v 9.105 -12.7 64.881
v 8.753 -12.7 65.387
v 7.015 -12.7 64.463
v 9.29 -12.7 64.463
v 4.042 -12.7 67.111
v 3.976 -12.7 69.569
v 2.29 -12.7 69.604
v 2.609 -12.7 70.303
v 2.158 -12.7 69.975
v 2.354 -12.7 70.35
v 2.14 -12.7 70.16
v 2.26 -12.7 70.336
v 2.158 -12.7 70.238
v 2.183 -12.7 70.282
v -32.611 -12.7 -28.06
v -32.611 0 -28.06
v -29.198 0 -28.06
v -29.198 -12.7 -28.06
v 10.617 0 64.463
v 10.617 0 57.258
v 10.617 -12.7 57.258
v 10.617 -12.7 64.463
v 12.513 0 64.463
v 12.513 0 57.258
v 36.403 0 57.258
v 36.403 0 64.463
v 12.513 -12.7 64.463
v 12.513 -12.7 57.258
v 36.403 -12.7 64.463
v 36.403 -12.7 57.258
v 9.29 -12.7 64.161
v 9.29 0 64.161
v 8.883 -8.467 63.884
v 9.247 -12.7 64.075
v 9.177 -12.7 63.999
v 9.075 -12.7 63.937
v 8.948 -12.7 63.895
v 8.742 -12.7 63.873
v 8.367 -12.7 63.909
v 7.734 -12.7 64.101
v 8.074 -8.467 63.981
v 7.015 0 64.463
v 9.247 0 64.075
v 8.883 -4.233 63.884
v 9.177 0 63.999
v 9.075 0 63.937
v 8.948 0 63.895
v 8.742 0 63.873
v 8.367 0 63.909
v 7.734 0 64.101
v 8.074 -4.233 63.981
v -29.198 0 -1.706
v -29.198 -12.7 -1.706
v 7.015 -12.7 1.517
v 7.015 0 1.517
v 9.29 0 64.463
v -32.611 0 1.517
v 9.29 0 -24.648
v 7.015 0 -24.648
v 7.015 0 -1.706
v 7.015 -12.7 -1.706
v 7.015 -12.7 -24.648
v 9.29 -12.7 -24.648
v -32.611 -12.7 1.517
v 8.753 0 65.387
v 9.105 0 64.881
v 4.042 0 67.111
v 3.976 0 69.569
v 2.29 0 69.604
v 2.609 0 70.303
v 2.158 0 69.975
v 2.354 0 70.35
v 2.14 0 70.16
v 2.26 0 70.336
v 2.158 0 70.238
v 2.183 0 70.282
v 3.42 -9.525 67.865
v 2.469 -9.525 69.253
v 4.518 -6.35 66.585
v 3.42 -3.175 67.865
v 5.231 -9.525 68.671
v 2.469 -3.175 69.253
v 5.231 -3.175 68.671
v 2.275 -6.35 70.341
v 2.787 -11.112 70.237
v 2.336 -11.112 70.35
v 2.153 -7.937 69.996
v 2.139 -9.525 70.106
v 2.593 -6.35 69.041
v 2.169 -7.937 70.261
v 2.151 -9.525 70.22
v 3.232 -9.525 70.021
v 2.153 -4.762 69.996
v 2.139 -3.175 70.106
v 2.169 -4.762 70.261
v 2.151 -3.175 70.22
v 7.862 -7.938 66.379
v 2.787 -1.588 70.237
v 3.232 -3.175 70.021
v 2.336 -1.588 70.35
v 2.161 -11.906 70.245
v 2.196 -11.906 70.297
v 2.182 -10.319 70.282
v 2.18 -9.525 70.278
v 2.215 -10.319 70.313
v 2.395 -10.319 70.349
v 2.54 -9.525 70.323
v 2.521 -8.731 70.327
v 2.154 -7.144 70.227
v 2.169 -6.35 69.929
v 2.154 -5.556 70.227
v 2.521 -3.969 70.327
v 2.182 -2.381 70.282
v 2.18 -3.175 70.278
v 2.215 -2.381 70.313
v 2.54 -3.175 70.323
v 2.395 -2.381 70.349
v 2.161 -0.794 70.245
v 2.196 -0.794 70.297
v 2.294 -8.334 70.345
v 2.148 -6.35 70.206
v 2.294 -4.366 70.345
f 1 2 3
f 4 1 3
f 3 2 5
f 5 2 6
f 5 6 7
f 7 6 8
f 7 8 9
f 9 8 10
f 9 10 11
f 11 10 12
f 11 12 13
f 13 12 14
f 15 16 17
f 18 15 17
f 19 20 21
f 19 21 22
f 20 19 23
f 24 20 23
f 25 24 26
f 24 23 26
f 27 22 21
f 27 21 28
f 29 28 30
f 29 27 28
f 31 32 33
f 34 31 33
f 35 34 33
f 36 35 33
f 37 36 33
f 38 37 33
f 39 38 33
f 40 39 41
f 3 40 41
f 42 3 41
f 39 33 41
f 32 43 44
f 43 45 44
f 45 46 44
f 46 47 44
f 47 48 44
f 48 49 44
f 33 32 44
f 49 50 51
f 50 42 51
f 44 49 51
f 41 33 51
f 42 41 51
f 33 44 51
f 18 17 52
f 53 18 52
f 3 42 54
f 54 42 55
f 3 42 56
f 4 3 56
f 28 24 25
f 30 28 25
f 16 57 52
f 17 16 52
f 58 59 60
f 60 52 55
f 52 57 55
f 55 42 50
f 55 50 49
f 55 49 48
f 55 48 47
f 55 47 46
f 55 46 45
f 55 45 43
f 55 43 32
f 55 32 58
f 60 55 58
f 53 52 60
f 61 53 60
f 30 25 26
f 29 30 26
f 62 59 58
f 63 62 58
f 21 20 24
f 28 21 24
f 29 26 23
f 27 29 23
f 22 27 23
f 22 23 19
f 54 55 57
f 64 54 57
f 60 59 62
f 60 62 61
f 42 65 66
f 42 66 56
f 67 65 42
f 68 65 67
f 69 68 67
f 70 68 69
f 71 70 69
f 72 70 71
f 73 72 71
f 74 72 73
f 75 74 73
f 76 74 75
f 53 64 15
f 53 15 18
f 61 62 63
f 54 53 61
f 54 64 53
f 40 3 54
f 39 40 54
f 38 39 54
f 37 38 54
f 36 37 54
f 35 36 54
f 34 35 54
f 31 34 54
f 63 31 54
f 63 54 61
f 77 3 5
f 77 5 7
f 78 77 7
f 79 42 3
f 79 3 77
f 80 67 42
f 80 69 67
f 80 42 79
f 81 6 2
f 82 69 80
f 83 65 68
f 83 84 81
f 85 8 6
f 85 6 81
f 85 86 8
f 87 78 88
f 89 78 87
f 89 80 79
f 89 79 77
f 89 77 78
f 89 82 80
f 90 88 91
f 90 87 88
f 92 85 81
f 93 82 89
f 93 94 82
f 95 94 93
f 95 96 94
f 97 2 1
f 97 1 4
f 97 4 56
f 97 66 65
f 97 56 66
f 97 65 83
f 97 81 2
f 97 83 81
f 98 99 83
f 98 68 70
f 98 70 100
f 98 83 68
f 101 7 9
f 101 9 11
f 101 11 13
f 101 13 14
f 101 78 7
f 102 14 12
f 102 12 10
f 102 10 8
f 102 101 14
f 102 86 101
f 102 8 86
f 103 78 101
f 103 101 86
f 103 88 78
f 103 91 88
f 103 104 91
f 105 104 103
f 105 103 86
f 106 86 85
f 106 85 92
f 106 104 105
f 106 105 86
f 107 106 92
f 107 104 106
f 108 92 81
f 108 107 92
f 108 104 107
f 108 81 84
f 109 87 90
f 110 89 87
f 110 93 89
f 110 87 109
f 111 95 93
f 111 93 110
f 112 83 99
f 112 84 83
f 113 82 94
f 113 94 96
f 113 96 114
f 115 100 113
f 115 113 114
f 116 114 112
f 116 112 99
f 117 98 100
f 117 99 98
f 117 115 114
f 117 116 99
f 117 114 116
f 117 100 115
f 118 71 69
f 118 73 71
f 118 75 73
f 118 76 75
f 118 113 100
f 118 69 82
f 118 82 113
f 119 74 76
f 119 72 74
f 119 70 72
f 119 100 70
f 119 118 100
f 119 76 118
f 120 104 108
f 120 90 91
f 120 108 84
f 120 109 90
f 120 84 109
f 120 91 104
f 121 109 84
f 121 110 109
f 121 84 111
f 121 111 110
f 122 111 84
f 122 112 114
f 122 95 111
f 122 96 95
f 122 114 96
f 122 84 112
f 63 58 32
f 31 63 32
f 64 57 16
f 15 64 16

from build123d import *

# Parameters (mm, degrees)
F0_W     = 2.2751665674
F0_H     = 34.6962790936
F0_H_2   = 23.6996444874
F0_H_3   = 2.4647631217
F0_H_4   = 22.9412544286
F0_W_2   = 3.4127477556
F0_H_5   = 26.3540040469
F1_DEPTH = 12.7
F0_W_3   = 1.8959725276
F0_H_6   = 7.2046890855


with BuildPart() as f1:
    # F0 (on Front) → F1 (new body)
    with BuildSketch(Plane.XZ):
        with Locations((8.1526779104, 45.0293244794)):
            Rectangle(F0_W, F0_H)
        with Locations((8.1526779104, 15.8313626889)):
            Rectangle(F0_W, F0_H_2)
        with BuildLine():
            Line((7.0150946267, 62.3774640262), (9.2902611941, 62.3774640262))
            Line((9.2902611941, 62.3774640262), (9.2902611941, 64.1605353109))
            add(Edge.make_bspline(
                [(9.2902611941, 64.1605353109), (9.1335618574, 63.6997464733), (8.1491547275, 63.7852449602), (7.0150946267, 64.4630342722)],
                knots=[0.8245103323, 0.8245103323, 0.8245103323, 0.8245103323, 1, 1, 1, 1], degree=3))
            Line((7.0150946267, 64.4630342722), (7.0150946267, 62.3774640262))
        make_face()
        with Locations((8.1526779104, 2.7491588844)):
            Rectangle(F0_W, F0_H_3)
        Polygon((7.0150946267, -1.7063744599), (9.2902611941, -1.7063744599), (9.2902611941, 1.5167773236), (7.0150946267, 1.5167773236), (-32.6107107103, 1.5167773236), (-32.6107107103, -1.7063744599), (-29.1979629546, -1.7063744599), align=None)
        with Locations((8.1526779104, -13.1770016742)):
            Rectangle(F0_W, F0_H_4)
        with Locations((-30.9043368325, -14.8833764833)):
            Rectangle(F0_W_2, F0_H_5)
    extrude(amount=F1_DEPTH)


with BuildPart() as f1b:
    # F0 (on Front) → F1, piece 2 (new body)
    with BuildSketch(Plane.XZ):
        with BuildLine():
            Line((18.3322279583, 64.4630342722), (16.5536516477, 64.4630342722))
            ThreePointArc((16.5536516477, 64.4630342722), (16.3197251146, 60.7995982546), (19.5371083055, 62.567062676))
            ThreePointArc((19.5371083055, 62.567062676), (19.2104042244, 63.6902773643), (18.3322279583, 64.4630342722))
        make_face()
        with BuildLine():
            Line((16.5536516477, 64.4630342722), (12.5134121627, 64.4630342722))
            Line((12.5134121627, 64.4630342722), (12.5134121627, 57.2583451867))
            Line((12.5134121627, 57.2583451867), (31.0308237794, 57.2583451867))
            add(Edge.make_bspline(
                [(28.0593987554, 59.1532960534), (28.1995493071, 58.4423556179), (29.5783060091, 57.4592646397), (31.0308237794, 57.2583451867)],
                knots=[0, 0, 0, 0, 0.2197954008, 0.2197954008, 0.2197954008, 0.2197954008], degree=3))
            add(Edge.make_bspline(
                [(32.0415794849, 57.2583451867), (33.6607920173, 57.5084545772), (36.5329207315, 60.8323030514), (30.1164253974, 60.8116762265), (27.9300518274, 59.8094330449), (28.0593987554, 59.1532960534)],
                knots=[0.2709134065, 0.2709134065, 0.2709134065, 0.2709134065, 0.520871318, 0.7971477133, 1, 1, 1, 1], degree=3))
            Line((32.0415794849, 57.2583451867), (36.4026576281, 57.2583451867))
            Line((36.4026576281, 57.2583451867), (36.4026576281, 64.4630342722))
            Line((36.4026576281, 64.4630342722), (18.3322279583, 64.4630342722))
            ThreePointArc((18.3322279583, 64.4630342722), (19.2104042244, 63.6902773643), (19.5371083055, 62.567062676))
            ThreePointArc((19.5371083055, 62.567062676), (16.3197251146, 60.7995982546), (16.5536516477, 64.4630342722))
        make_face()
        with Locations((11.5654258989, 60.8606897295)):
            Rectangle(F0_W_3, F0_H_6)
        with BuildLine():
            add(Edge.make_bspline(
                [(28.0593987554, 59.1532960534), (28.1995493071, 58.4423556179), (29.5783060091, 57.4592646397), (31.0308237794, 57.2583451867)],
                knots=[0, 0, 0, 0, 0.2197954008, 0.2197954008, 0.2197954008, 0.2197954008], degree=3))
            Line((31.0308237794, 57.2583451867), (32.0415794849, 57.2583451867))
            add(Edge.make_bspline(
                [(32.0415794849, 57.2583451867), (33.6607920173, 57.5084545772), (36.5329207315, 60.8323030514), (30.1164253974, 60.8116762265), (27.9300518274, 59.8094330449), (28.0593987554, 59.1532960534)],
                knots=[0.2709134065, 0.2709134065, 0.2709134065, 0.2709134065, 0.520871318, 0.7971477133, 1, 1, 1, 1], degree=3))
        make_face()
    extrude(amount=F1_DEPTH)


with BuildPart() as f1c:
    # F0 (on Front) → F1, piece 3 (new body)
    with BuildSketch(Plane.XZ):
        with BuildLine():
            add(Edge.make_bspline(
                [(7.0150946267, 64.4630342722), (4.5763824236, 65.9205699576), (-2.001147026, 74.7371280941), (8.9018578762, 66.0171053089), (9.2902611941, 64.4630342722)],
                knots=[0, 0, 0, 0, 0.3773775251, 0.7928471179, 0.7928471179, 0.7928471179, 0.7928471179], degree=3))
            Line((7.0150946267, 64.4630342722), (9.2902611941, 64.4630342722))
        make_face()
    extrude(amount=F1_DEPTH)


solid = Compound([f1.part, f1b.part, f1c.part])
